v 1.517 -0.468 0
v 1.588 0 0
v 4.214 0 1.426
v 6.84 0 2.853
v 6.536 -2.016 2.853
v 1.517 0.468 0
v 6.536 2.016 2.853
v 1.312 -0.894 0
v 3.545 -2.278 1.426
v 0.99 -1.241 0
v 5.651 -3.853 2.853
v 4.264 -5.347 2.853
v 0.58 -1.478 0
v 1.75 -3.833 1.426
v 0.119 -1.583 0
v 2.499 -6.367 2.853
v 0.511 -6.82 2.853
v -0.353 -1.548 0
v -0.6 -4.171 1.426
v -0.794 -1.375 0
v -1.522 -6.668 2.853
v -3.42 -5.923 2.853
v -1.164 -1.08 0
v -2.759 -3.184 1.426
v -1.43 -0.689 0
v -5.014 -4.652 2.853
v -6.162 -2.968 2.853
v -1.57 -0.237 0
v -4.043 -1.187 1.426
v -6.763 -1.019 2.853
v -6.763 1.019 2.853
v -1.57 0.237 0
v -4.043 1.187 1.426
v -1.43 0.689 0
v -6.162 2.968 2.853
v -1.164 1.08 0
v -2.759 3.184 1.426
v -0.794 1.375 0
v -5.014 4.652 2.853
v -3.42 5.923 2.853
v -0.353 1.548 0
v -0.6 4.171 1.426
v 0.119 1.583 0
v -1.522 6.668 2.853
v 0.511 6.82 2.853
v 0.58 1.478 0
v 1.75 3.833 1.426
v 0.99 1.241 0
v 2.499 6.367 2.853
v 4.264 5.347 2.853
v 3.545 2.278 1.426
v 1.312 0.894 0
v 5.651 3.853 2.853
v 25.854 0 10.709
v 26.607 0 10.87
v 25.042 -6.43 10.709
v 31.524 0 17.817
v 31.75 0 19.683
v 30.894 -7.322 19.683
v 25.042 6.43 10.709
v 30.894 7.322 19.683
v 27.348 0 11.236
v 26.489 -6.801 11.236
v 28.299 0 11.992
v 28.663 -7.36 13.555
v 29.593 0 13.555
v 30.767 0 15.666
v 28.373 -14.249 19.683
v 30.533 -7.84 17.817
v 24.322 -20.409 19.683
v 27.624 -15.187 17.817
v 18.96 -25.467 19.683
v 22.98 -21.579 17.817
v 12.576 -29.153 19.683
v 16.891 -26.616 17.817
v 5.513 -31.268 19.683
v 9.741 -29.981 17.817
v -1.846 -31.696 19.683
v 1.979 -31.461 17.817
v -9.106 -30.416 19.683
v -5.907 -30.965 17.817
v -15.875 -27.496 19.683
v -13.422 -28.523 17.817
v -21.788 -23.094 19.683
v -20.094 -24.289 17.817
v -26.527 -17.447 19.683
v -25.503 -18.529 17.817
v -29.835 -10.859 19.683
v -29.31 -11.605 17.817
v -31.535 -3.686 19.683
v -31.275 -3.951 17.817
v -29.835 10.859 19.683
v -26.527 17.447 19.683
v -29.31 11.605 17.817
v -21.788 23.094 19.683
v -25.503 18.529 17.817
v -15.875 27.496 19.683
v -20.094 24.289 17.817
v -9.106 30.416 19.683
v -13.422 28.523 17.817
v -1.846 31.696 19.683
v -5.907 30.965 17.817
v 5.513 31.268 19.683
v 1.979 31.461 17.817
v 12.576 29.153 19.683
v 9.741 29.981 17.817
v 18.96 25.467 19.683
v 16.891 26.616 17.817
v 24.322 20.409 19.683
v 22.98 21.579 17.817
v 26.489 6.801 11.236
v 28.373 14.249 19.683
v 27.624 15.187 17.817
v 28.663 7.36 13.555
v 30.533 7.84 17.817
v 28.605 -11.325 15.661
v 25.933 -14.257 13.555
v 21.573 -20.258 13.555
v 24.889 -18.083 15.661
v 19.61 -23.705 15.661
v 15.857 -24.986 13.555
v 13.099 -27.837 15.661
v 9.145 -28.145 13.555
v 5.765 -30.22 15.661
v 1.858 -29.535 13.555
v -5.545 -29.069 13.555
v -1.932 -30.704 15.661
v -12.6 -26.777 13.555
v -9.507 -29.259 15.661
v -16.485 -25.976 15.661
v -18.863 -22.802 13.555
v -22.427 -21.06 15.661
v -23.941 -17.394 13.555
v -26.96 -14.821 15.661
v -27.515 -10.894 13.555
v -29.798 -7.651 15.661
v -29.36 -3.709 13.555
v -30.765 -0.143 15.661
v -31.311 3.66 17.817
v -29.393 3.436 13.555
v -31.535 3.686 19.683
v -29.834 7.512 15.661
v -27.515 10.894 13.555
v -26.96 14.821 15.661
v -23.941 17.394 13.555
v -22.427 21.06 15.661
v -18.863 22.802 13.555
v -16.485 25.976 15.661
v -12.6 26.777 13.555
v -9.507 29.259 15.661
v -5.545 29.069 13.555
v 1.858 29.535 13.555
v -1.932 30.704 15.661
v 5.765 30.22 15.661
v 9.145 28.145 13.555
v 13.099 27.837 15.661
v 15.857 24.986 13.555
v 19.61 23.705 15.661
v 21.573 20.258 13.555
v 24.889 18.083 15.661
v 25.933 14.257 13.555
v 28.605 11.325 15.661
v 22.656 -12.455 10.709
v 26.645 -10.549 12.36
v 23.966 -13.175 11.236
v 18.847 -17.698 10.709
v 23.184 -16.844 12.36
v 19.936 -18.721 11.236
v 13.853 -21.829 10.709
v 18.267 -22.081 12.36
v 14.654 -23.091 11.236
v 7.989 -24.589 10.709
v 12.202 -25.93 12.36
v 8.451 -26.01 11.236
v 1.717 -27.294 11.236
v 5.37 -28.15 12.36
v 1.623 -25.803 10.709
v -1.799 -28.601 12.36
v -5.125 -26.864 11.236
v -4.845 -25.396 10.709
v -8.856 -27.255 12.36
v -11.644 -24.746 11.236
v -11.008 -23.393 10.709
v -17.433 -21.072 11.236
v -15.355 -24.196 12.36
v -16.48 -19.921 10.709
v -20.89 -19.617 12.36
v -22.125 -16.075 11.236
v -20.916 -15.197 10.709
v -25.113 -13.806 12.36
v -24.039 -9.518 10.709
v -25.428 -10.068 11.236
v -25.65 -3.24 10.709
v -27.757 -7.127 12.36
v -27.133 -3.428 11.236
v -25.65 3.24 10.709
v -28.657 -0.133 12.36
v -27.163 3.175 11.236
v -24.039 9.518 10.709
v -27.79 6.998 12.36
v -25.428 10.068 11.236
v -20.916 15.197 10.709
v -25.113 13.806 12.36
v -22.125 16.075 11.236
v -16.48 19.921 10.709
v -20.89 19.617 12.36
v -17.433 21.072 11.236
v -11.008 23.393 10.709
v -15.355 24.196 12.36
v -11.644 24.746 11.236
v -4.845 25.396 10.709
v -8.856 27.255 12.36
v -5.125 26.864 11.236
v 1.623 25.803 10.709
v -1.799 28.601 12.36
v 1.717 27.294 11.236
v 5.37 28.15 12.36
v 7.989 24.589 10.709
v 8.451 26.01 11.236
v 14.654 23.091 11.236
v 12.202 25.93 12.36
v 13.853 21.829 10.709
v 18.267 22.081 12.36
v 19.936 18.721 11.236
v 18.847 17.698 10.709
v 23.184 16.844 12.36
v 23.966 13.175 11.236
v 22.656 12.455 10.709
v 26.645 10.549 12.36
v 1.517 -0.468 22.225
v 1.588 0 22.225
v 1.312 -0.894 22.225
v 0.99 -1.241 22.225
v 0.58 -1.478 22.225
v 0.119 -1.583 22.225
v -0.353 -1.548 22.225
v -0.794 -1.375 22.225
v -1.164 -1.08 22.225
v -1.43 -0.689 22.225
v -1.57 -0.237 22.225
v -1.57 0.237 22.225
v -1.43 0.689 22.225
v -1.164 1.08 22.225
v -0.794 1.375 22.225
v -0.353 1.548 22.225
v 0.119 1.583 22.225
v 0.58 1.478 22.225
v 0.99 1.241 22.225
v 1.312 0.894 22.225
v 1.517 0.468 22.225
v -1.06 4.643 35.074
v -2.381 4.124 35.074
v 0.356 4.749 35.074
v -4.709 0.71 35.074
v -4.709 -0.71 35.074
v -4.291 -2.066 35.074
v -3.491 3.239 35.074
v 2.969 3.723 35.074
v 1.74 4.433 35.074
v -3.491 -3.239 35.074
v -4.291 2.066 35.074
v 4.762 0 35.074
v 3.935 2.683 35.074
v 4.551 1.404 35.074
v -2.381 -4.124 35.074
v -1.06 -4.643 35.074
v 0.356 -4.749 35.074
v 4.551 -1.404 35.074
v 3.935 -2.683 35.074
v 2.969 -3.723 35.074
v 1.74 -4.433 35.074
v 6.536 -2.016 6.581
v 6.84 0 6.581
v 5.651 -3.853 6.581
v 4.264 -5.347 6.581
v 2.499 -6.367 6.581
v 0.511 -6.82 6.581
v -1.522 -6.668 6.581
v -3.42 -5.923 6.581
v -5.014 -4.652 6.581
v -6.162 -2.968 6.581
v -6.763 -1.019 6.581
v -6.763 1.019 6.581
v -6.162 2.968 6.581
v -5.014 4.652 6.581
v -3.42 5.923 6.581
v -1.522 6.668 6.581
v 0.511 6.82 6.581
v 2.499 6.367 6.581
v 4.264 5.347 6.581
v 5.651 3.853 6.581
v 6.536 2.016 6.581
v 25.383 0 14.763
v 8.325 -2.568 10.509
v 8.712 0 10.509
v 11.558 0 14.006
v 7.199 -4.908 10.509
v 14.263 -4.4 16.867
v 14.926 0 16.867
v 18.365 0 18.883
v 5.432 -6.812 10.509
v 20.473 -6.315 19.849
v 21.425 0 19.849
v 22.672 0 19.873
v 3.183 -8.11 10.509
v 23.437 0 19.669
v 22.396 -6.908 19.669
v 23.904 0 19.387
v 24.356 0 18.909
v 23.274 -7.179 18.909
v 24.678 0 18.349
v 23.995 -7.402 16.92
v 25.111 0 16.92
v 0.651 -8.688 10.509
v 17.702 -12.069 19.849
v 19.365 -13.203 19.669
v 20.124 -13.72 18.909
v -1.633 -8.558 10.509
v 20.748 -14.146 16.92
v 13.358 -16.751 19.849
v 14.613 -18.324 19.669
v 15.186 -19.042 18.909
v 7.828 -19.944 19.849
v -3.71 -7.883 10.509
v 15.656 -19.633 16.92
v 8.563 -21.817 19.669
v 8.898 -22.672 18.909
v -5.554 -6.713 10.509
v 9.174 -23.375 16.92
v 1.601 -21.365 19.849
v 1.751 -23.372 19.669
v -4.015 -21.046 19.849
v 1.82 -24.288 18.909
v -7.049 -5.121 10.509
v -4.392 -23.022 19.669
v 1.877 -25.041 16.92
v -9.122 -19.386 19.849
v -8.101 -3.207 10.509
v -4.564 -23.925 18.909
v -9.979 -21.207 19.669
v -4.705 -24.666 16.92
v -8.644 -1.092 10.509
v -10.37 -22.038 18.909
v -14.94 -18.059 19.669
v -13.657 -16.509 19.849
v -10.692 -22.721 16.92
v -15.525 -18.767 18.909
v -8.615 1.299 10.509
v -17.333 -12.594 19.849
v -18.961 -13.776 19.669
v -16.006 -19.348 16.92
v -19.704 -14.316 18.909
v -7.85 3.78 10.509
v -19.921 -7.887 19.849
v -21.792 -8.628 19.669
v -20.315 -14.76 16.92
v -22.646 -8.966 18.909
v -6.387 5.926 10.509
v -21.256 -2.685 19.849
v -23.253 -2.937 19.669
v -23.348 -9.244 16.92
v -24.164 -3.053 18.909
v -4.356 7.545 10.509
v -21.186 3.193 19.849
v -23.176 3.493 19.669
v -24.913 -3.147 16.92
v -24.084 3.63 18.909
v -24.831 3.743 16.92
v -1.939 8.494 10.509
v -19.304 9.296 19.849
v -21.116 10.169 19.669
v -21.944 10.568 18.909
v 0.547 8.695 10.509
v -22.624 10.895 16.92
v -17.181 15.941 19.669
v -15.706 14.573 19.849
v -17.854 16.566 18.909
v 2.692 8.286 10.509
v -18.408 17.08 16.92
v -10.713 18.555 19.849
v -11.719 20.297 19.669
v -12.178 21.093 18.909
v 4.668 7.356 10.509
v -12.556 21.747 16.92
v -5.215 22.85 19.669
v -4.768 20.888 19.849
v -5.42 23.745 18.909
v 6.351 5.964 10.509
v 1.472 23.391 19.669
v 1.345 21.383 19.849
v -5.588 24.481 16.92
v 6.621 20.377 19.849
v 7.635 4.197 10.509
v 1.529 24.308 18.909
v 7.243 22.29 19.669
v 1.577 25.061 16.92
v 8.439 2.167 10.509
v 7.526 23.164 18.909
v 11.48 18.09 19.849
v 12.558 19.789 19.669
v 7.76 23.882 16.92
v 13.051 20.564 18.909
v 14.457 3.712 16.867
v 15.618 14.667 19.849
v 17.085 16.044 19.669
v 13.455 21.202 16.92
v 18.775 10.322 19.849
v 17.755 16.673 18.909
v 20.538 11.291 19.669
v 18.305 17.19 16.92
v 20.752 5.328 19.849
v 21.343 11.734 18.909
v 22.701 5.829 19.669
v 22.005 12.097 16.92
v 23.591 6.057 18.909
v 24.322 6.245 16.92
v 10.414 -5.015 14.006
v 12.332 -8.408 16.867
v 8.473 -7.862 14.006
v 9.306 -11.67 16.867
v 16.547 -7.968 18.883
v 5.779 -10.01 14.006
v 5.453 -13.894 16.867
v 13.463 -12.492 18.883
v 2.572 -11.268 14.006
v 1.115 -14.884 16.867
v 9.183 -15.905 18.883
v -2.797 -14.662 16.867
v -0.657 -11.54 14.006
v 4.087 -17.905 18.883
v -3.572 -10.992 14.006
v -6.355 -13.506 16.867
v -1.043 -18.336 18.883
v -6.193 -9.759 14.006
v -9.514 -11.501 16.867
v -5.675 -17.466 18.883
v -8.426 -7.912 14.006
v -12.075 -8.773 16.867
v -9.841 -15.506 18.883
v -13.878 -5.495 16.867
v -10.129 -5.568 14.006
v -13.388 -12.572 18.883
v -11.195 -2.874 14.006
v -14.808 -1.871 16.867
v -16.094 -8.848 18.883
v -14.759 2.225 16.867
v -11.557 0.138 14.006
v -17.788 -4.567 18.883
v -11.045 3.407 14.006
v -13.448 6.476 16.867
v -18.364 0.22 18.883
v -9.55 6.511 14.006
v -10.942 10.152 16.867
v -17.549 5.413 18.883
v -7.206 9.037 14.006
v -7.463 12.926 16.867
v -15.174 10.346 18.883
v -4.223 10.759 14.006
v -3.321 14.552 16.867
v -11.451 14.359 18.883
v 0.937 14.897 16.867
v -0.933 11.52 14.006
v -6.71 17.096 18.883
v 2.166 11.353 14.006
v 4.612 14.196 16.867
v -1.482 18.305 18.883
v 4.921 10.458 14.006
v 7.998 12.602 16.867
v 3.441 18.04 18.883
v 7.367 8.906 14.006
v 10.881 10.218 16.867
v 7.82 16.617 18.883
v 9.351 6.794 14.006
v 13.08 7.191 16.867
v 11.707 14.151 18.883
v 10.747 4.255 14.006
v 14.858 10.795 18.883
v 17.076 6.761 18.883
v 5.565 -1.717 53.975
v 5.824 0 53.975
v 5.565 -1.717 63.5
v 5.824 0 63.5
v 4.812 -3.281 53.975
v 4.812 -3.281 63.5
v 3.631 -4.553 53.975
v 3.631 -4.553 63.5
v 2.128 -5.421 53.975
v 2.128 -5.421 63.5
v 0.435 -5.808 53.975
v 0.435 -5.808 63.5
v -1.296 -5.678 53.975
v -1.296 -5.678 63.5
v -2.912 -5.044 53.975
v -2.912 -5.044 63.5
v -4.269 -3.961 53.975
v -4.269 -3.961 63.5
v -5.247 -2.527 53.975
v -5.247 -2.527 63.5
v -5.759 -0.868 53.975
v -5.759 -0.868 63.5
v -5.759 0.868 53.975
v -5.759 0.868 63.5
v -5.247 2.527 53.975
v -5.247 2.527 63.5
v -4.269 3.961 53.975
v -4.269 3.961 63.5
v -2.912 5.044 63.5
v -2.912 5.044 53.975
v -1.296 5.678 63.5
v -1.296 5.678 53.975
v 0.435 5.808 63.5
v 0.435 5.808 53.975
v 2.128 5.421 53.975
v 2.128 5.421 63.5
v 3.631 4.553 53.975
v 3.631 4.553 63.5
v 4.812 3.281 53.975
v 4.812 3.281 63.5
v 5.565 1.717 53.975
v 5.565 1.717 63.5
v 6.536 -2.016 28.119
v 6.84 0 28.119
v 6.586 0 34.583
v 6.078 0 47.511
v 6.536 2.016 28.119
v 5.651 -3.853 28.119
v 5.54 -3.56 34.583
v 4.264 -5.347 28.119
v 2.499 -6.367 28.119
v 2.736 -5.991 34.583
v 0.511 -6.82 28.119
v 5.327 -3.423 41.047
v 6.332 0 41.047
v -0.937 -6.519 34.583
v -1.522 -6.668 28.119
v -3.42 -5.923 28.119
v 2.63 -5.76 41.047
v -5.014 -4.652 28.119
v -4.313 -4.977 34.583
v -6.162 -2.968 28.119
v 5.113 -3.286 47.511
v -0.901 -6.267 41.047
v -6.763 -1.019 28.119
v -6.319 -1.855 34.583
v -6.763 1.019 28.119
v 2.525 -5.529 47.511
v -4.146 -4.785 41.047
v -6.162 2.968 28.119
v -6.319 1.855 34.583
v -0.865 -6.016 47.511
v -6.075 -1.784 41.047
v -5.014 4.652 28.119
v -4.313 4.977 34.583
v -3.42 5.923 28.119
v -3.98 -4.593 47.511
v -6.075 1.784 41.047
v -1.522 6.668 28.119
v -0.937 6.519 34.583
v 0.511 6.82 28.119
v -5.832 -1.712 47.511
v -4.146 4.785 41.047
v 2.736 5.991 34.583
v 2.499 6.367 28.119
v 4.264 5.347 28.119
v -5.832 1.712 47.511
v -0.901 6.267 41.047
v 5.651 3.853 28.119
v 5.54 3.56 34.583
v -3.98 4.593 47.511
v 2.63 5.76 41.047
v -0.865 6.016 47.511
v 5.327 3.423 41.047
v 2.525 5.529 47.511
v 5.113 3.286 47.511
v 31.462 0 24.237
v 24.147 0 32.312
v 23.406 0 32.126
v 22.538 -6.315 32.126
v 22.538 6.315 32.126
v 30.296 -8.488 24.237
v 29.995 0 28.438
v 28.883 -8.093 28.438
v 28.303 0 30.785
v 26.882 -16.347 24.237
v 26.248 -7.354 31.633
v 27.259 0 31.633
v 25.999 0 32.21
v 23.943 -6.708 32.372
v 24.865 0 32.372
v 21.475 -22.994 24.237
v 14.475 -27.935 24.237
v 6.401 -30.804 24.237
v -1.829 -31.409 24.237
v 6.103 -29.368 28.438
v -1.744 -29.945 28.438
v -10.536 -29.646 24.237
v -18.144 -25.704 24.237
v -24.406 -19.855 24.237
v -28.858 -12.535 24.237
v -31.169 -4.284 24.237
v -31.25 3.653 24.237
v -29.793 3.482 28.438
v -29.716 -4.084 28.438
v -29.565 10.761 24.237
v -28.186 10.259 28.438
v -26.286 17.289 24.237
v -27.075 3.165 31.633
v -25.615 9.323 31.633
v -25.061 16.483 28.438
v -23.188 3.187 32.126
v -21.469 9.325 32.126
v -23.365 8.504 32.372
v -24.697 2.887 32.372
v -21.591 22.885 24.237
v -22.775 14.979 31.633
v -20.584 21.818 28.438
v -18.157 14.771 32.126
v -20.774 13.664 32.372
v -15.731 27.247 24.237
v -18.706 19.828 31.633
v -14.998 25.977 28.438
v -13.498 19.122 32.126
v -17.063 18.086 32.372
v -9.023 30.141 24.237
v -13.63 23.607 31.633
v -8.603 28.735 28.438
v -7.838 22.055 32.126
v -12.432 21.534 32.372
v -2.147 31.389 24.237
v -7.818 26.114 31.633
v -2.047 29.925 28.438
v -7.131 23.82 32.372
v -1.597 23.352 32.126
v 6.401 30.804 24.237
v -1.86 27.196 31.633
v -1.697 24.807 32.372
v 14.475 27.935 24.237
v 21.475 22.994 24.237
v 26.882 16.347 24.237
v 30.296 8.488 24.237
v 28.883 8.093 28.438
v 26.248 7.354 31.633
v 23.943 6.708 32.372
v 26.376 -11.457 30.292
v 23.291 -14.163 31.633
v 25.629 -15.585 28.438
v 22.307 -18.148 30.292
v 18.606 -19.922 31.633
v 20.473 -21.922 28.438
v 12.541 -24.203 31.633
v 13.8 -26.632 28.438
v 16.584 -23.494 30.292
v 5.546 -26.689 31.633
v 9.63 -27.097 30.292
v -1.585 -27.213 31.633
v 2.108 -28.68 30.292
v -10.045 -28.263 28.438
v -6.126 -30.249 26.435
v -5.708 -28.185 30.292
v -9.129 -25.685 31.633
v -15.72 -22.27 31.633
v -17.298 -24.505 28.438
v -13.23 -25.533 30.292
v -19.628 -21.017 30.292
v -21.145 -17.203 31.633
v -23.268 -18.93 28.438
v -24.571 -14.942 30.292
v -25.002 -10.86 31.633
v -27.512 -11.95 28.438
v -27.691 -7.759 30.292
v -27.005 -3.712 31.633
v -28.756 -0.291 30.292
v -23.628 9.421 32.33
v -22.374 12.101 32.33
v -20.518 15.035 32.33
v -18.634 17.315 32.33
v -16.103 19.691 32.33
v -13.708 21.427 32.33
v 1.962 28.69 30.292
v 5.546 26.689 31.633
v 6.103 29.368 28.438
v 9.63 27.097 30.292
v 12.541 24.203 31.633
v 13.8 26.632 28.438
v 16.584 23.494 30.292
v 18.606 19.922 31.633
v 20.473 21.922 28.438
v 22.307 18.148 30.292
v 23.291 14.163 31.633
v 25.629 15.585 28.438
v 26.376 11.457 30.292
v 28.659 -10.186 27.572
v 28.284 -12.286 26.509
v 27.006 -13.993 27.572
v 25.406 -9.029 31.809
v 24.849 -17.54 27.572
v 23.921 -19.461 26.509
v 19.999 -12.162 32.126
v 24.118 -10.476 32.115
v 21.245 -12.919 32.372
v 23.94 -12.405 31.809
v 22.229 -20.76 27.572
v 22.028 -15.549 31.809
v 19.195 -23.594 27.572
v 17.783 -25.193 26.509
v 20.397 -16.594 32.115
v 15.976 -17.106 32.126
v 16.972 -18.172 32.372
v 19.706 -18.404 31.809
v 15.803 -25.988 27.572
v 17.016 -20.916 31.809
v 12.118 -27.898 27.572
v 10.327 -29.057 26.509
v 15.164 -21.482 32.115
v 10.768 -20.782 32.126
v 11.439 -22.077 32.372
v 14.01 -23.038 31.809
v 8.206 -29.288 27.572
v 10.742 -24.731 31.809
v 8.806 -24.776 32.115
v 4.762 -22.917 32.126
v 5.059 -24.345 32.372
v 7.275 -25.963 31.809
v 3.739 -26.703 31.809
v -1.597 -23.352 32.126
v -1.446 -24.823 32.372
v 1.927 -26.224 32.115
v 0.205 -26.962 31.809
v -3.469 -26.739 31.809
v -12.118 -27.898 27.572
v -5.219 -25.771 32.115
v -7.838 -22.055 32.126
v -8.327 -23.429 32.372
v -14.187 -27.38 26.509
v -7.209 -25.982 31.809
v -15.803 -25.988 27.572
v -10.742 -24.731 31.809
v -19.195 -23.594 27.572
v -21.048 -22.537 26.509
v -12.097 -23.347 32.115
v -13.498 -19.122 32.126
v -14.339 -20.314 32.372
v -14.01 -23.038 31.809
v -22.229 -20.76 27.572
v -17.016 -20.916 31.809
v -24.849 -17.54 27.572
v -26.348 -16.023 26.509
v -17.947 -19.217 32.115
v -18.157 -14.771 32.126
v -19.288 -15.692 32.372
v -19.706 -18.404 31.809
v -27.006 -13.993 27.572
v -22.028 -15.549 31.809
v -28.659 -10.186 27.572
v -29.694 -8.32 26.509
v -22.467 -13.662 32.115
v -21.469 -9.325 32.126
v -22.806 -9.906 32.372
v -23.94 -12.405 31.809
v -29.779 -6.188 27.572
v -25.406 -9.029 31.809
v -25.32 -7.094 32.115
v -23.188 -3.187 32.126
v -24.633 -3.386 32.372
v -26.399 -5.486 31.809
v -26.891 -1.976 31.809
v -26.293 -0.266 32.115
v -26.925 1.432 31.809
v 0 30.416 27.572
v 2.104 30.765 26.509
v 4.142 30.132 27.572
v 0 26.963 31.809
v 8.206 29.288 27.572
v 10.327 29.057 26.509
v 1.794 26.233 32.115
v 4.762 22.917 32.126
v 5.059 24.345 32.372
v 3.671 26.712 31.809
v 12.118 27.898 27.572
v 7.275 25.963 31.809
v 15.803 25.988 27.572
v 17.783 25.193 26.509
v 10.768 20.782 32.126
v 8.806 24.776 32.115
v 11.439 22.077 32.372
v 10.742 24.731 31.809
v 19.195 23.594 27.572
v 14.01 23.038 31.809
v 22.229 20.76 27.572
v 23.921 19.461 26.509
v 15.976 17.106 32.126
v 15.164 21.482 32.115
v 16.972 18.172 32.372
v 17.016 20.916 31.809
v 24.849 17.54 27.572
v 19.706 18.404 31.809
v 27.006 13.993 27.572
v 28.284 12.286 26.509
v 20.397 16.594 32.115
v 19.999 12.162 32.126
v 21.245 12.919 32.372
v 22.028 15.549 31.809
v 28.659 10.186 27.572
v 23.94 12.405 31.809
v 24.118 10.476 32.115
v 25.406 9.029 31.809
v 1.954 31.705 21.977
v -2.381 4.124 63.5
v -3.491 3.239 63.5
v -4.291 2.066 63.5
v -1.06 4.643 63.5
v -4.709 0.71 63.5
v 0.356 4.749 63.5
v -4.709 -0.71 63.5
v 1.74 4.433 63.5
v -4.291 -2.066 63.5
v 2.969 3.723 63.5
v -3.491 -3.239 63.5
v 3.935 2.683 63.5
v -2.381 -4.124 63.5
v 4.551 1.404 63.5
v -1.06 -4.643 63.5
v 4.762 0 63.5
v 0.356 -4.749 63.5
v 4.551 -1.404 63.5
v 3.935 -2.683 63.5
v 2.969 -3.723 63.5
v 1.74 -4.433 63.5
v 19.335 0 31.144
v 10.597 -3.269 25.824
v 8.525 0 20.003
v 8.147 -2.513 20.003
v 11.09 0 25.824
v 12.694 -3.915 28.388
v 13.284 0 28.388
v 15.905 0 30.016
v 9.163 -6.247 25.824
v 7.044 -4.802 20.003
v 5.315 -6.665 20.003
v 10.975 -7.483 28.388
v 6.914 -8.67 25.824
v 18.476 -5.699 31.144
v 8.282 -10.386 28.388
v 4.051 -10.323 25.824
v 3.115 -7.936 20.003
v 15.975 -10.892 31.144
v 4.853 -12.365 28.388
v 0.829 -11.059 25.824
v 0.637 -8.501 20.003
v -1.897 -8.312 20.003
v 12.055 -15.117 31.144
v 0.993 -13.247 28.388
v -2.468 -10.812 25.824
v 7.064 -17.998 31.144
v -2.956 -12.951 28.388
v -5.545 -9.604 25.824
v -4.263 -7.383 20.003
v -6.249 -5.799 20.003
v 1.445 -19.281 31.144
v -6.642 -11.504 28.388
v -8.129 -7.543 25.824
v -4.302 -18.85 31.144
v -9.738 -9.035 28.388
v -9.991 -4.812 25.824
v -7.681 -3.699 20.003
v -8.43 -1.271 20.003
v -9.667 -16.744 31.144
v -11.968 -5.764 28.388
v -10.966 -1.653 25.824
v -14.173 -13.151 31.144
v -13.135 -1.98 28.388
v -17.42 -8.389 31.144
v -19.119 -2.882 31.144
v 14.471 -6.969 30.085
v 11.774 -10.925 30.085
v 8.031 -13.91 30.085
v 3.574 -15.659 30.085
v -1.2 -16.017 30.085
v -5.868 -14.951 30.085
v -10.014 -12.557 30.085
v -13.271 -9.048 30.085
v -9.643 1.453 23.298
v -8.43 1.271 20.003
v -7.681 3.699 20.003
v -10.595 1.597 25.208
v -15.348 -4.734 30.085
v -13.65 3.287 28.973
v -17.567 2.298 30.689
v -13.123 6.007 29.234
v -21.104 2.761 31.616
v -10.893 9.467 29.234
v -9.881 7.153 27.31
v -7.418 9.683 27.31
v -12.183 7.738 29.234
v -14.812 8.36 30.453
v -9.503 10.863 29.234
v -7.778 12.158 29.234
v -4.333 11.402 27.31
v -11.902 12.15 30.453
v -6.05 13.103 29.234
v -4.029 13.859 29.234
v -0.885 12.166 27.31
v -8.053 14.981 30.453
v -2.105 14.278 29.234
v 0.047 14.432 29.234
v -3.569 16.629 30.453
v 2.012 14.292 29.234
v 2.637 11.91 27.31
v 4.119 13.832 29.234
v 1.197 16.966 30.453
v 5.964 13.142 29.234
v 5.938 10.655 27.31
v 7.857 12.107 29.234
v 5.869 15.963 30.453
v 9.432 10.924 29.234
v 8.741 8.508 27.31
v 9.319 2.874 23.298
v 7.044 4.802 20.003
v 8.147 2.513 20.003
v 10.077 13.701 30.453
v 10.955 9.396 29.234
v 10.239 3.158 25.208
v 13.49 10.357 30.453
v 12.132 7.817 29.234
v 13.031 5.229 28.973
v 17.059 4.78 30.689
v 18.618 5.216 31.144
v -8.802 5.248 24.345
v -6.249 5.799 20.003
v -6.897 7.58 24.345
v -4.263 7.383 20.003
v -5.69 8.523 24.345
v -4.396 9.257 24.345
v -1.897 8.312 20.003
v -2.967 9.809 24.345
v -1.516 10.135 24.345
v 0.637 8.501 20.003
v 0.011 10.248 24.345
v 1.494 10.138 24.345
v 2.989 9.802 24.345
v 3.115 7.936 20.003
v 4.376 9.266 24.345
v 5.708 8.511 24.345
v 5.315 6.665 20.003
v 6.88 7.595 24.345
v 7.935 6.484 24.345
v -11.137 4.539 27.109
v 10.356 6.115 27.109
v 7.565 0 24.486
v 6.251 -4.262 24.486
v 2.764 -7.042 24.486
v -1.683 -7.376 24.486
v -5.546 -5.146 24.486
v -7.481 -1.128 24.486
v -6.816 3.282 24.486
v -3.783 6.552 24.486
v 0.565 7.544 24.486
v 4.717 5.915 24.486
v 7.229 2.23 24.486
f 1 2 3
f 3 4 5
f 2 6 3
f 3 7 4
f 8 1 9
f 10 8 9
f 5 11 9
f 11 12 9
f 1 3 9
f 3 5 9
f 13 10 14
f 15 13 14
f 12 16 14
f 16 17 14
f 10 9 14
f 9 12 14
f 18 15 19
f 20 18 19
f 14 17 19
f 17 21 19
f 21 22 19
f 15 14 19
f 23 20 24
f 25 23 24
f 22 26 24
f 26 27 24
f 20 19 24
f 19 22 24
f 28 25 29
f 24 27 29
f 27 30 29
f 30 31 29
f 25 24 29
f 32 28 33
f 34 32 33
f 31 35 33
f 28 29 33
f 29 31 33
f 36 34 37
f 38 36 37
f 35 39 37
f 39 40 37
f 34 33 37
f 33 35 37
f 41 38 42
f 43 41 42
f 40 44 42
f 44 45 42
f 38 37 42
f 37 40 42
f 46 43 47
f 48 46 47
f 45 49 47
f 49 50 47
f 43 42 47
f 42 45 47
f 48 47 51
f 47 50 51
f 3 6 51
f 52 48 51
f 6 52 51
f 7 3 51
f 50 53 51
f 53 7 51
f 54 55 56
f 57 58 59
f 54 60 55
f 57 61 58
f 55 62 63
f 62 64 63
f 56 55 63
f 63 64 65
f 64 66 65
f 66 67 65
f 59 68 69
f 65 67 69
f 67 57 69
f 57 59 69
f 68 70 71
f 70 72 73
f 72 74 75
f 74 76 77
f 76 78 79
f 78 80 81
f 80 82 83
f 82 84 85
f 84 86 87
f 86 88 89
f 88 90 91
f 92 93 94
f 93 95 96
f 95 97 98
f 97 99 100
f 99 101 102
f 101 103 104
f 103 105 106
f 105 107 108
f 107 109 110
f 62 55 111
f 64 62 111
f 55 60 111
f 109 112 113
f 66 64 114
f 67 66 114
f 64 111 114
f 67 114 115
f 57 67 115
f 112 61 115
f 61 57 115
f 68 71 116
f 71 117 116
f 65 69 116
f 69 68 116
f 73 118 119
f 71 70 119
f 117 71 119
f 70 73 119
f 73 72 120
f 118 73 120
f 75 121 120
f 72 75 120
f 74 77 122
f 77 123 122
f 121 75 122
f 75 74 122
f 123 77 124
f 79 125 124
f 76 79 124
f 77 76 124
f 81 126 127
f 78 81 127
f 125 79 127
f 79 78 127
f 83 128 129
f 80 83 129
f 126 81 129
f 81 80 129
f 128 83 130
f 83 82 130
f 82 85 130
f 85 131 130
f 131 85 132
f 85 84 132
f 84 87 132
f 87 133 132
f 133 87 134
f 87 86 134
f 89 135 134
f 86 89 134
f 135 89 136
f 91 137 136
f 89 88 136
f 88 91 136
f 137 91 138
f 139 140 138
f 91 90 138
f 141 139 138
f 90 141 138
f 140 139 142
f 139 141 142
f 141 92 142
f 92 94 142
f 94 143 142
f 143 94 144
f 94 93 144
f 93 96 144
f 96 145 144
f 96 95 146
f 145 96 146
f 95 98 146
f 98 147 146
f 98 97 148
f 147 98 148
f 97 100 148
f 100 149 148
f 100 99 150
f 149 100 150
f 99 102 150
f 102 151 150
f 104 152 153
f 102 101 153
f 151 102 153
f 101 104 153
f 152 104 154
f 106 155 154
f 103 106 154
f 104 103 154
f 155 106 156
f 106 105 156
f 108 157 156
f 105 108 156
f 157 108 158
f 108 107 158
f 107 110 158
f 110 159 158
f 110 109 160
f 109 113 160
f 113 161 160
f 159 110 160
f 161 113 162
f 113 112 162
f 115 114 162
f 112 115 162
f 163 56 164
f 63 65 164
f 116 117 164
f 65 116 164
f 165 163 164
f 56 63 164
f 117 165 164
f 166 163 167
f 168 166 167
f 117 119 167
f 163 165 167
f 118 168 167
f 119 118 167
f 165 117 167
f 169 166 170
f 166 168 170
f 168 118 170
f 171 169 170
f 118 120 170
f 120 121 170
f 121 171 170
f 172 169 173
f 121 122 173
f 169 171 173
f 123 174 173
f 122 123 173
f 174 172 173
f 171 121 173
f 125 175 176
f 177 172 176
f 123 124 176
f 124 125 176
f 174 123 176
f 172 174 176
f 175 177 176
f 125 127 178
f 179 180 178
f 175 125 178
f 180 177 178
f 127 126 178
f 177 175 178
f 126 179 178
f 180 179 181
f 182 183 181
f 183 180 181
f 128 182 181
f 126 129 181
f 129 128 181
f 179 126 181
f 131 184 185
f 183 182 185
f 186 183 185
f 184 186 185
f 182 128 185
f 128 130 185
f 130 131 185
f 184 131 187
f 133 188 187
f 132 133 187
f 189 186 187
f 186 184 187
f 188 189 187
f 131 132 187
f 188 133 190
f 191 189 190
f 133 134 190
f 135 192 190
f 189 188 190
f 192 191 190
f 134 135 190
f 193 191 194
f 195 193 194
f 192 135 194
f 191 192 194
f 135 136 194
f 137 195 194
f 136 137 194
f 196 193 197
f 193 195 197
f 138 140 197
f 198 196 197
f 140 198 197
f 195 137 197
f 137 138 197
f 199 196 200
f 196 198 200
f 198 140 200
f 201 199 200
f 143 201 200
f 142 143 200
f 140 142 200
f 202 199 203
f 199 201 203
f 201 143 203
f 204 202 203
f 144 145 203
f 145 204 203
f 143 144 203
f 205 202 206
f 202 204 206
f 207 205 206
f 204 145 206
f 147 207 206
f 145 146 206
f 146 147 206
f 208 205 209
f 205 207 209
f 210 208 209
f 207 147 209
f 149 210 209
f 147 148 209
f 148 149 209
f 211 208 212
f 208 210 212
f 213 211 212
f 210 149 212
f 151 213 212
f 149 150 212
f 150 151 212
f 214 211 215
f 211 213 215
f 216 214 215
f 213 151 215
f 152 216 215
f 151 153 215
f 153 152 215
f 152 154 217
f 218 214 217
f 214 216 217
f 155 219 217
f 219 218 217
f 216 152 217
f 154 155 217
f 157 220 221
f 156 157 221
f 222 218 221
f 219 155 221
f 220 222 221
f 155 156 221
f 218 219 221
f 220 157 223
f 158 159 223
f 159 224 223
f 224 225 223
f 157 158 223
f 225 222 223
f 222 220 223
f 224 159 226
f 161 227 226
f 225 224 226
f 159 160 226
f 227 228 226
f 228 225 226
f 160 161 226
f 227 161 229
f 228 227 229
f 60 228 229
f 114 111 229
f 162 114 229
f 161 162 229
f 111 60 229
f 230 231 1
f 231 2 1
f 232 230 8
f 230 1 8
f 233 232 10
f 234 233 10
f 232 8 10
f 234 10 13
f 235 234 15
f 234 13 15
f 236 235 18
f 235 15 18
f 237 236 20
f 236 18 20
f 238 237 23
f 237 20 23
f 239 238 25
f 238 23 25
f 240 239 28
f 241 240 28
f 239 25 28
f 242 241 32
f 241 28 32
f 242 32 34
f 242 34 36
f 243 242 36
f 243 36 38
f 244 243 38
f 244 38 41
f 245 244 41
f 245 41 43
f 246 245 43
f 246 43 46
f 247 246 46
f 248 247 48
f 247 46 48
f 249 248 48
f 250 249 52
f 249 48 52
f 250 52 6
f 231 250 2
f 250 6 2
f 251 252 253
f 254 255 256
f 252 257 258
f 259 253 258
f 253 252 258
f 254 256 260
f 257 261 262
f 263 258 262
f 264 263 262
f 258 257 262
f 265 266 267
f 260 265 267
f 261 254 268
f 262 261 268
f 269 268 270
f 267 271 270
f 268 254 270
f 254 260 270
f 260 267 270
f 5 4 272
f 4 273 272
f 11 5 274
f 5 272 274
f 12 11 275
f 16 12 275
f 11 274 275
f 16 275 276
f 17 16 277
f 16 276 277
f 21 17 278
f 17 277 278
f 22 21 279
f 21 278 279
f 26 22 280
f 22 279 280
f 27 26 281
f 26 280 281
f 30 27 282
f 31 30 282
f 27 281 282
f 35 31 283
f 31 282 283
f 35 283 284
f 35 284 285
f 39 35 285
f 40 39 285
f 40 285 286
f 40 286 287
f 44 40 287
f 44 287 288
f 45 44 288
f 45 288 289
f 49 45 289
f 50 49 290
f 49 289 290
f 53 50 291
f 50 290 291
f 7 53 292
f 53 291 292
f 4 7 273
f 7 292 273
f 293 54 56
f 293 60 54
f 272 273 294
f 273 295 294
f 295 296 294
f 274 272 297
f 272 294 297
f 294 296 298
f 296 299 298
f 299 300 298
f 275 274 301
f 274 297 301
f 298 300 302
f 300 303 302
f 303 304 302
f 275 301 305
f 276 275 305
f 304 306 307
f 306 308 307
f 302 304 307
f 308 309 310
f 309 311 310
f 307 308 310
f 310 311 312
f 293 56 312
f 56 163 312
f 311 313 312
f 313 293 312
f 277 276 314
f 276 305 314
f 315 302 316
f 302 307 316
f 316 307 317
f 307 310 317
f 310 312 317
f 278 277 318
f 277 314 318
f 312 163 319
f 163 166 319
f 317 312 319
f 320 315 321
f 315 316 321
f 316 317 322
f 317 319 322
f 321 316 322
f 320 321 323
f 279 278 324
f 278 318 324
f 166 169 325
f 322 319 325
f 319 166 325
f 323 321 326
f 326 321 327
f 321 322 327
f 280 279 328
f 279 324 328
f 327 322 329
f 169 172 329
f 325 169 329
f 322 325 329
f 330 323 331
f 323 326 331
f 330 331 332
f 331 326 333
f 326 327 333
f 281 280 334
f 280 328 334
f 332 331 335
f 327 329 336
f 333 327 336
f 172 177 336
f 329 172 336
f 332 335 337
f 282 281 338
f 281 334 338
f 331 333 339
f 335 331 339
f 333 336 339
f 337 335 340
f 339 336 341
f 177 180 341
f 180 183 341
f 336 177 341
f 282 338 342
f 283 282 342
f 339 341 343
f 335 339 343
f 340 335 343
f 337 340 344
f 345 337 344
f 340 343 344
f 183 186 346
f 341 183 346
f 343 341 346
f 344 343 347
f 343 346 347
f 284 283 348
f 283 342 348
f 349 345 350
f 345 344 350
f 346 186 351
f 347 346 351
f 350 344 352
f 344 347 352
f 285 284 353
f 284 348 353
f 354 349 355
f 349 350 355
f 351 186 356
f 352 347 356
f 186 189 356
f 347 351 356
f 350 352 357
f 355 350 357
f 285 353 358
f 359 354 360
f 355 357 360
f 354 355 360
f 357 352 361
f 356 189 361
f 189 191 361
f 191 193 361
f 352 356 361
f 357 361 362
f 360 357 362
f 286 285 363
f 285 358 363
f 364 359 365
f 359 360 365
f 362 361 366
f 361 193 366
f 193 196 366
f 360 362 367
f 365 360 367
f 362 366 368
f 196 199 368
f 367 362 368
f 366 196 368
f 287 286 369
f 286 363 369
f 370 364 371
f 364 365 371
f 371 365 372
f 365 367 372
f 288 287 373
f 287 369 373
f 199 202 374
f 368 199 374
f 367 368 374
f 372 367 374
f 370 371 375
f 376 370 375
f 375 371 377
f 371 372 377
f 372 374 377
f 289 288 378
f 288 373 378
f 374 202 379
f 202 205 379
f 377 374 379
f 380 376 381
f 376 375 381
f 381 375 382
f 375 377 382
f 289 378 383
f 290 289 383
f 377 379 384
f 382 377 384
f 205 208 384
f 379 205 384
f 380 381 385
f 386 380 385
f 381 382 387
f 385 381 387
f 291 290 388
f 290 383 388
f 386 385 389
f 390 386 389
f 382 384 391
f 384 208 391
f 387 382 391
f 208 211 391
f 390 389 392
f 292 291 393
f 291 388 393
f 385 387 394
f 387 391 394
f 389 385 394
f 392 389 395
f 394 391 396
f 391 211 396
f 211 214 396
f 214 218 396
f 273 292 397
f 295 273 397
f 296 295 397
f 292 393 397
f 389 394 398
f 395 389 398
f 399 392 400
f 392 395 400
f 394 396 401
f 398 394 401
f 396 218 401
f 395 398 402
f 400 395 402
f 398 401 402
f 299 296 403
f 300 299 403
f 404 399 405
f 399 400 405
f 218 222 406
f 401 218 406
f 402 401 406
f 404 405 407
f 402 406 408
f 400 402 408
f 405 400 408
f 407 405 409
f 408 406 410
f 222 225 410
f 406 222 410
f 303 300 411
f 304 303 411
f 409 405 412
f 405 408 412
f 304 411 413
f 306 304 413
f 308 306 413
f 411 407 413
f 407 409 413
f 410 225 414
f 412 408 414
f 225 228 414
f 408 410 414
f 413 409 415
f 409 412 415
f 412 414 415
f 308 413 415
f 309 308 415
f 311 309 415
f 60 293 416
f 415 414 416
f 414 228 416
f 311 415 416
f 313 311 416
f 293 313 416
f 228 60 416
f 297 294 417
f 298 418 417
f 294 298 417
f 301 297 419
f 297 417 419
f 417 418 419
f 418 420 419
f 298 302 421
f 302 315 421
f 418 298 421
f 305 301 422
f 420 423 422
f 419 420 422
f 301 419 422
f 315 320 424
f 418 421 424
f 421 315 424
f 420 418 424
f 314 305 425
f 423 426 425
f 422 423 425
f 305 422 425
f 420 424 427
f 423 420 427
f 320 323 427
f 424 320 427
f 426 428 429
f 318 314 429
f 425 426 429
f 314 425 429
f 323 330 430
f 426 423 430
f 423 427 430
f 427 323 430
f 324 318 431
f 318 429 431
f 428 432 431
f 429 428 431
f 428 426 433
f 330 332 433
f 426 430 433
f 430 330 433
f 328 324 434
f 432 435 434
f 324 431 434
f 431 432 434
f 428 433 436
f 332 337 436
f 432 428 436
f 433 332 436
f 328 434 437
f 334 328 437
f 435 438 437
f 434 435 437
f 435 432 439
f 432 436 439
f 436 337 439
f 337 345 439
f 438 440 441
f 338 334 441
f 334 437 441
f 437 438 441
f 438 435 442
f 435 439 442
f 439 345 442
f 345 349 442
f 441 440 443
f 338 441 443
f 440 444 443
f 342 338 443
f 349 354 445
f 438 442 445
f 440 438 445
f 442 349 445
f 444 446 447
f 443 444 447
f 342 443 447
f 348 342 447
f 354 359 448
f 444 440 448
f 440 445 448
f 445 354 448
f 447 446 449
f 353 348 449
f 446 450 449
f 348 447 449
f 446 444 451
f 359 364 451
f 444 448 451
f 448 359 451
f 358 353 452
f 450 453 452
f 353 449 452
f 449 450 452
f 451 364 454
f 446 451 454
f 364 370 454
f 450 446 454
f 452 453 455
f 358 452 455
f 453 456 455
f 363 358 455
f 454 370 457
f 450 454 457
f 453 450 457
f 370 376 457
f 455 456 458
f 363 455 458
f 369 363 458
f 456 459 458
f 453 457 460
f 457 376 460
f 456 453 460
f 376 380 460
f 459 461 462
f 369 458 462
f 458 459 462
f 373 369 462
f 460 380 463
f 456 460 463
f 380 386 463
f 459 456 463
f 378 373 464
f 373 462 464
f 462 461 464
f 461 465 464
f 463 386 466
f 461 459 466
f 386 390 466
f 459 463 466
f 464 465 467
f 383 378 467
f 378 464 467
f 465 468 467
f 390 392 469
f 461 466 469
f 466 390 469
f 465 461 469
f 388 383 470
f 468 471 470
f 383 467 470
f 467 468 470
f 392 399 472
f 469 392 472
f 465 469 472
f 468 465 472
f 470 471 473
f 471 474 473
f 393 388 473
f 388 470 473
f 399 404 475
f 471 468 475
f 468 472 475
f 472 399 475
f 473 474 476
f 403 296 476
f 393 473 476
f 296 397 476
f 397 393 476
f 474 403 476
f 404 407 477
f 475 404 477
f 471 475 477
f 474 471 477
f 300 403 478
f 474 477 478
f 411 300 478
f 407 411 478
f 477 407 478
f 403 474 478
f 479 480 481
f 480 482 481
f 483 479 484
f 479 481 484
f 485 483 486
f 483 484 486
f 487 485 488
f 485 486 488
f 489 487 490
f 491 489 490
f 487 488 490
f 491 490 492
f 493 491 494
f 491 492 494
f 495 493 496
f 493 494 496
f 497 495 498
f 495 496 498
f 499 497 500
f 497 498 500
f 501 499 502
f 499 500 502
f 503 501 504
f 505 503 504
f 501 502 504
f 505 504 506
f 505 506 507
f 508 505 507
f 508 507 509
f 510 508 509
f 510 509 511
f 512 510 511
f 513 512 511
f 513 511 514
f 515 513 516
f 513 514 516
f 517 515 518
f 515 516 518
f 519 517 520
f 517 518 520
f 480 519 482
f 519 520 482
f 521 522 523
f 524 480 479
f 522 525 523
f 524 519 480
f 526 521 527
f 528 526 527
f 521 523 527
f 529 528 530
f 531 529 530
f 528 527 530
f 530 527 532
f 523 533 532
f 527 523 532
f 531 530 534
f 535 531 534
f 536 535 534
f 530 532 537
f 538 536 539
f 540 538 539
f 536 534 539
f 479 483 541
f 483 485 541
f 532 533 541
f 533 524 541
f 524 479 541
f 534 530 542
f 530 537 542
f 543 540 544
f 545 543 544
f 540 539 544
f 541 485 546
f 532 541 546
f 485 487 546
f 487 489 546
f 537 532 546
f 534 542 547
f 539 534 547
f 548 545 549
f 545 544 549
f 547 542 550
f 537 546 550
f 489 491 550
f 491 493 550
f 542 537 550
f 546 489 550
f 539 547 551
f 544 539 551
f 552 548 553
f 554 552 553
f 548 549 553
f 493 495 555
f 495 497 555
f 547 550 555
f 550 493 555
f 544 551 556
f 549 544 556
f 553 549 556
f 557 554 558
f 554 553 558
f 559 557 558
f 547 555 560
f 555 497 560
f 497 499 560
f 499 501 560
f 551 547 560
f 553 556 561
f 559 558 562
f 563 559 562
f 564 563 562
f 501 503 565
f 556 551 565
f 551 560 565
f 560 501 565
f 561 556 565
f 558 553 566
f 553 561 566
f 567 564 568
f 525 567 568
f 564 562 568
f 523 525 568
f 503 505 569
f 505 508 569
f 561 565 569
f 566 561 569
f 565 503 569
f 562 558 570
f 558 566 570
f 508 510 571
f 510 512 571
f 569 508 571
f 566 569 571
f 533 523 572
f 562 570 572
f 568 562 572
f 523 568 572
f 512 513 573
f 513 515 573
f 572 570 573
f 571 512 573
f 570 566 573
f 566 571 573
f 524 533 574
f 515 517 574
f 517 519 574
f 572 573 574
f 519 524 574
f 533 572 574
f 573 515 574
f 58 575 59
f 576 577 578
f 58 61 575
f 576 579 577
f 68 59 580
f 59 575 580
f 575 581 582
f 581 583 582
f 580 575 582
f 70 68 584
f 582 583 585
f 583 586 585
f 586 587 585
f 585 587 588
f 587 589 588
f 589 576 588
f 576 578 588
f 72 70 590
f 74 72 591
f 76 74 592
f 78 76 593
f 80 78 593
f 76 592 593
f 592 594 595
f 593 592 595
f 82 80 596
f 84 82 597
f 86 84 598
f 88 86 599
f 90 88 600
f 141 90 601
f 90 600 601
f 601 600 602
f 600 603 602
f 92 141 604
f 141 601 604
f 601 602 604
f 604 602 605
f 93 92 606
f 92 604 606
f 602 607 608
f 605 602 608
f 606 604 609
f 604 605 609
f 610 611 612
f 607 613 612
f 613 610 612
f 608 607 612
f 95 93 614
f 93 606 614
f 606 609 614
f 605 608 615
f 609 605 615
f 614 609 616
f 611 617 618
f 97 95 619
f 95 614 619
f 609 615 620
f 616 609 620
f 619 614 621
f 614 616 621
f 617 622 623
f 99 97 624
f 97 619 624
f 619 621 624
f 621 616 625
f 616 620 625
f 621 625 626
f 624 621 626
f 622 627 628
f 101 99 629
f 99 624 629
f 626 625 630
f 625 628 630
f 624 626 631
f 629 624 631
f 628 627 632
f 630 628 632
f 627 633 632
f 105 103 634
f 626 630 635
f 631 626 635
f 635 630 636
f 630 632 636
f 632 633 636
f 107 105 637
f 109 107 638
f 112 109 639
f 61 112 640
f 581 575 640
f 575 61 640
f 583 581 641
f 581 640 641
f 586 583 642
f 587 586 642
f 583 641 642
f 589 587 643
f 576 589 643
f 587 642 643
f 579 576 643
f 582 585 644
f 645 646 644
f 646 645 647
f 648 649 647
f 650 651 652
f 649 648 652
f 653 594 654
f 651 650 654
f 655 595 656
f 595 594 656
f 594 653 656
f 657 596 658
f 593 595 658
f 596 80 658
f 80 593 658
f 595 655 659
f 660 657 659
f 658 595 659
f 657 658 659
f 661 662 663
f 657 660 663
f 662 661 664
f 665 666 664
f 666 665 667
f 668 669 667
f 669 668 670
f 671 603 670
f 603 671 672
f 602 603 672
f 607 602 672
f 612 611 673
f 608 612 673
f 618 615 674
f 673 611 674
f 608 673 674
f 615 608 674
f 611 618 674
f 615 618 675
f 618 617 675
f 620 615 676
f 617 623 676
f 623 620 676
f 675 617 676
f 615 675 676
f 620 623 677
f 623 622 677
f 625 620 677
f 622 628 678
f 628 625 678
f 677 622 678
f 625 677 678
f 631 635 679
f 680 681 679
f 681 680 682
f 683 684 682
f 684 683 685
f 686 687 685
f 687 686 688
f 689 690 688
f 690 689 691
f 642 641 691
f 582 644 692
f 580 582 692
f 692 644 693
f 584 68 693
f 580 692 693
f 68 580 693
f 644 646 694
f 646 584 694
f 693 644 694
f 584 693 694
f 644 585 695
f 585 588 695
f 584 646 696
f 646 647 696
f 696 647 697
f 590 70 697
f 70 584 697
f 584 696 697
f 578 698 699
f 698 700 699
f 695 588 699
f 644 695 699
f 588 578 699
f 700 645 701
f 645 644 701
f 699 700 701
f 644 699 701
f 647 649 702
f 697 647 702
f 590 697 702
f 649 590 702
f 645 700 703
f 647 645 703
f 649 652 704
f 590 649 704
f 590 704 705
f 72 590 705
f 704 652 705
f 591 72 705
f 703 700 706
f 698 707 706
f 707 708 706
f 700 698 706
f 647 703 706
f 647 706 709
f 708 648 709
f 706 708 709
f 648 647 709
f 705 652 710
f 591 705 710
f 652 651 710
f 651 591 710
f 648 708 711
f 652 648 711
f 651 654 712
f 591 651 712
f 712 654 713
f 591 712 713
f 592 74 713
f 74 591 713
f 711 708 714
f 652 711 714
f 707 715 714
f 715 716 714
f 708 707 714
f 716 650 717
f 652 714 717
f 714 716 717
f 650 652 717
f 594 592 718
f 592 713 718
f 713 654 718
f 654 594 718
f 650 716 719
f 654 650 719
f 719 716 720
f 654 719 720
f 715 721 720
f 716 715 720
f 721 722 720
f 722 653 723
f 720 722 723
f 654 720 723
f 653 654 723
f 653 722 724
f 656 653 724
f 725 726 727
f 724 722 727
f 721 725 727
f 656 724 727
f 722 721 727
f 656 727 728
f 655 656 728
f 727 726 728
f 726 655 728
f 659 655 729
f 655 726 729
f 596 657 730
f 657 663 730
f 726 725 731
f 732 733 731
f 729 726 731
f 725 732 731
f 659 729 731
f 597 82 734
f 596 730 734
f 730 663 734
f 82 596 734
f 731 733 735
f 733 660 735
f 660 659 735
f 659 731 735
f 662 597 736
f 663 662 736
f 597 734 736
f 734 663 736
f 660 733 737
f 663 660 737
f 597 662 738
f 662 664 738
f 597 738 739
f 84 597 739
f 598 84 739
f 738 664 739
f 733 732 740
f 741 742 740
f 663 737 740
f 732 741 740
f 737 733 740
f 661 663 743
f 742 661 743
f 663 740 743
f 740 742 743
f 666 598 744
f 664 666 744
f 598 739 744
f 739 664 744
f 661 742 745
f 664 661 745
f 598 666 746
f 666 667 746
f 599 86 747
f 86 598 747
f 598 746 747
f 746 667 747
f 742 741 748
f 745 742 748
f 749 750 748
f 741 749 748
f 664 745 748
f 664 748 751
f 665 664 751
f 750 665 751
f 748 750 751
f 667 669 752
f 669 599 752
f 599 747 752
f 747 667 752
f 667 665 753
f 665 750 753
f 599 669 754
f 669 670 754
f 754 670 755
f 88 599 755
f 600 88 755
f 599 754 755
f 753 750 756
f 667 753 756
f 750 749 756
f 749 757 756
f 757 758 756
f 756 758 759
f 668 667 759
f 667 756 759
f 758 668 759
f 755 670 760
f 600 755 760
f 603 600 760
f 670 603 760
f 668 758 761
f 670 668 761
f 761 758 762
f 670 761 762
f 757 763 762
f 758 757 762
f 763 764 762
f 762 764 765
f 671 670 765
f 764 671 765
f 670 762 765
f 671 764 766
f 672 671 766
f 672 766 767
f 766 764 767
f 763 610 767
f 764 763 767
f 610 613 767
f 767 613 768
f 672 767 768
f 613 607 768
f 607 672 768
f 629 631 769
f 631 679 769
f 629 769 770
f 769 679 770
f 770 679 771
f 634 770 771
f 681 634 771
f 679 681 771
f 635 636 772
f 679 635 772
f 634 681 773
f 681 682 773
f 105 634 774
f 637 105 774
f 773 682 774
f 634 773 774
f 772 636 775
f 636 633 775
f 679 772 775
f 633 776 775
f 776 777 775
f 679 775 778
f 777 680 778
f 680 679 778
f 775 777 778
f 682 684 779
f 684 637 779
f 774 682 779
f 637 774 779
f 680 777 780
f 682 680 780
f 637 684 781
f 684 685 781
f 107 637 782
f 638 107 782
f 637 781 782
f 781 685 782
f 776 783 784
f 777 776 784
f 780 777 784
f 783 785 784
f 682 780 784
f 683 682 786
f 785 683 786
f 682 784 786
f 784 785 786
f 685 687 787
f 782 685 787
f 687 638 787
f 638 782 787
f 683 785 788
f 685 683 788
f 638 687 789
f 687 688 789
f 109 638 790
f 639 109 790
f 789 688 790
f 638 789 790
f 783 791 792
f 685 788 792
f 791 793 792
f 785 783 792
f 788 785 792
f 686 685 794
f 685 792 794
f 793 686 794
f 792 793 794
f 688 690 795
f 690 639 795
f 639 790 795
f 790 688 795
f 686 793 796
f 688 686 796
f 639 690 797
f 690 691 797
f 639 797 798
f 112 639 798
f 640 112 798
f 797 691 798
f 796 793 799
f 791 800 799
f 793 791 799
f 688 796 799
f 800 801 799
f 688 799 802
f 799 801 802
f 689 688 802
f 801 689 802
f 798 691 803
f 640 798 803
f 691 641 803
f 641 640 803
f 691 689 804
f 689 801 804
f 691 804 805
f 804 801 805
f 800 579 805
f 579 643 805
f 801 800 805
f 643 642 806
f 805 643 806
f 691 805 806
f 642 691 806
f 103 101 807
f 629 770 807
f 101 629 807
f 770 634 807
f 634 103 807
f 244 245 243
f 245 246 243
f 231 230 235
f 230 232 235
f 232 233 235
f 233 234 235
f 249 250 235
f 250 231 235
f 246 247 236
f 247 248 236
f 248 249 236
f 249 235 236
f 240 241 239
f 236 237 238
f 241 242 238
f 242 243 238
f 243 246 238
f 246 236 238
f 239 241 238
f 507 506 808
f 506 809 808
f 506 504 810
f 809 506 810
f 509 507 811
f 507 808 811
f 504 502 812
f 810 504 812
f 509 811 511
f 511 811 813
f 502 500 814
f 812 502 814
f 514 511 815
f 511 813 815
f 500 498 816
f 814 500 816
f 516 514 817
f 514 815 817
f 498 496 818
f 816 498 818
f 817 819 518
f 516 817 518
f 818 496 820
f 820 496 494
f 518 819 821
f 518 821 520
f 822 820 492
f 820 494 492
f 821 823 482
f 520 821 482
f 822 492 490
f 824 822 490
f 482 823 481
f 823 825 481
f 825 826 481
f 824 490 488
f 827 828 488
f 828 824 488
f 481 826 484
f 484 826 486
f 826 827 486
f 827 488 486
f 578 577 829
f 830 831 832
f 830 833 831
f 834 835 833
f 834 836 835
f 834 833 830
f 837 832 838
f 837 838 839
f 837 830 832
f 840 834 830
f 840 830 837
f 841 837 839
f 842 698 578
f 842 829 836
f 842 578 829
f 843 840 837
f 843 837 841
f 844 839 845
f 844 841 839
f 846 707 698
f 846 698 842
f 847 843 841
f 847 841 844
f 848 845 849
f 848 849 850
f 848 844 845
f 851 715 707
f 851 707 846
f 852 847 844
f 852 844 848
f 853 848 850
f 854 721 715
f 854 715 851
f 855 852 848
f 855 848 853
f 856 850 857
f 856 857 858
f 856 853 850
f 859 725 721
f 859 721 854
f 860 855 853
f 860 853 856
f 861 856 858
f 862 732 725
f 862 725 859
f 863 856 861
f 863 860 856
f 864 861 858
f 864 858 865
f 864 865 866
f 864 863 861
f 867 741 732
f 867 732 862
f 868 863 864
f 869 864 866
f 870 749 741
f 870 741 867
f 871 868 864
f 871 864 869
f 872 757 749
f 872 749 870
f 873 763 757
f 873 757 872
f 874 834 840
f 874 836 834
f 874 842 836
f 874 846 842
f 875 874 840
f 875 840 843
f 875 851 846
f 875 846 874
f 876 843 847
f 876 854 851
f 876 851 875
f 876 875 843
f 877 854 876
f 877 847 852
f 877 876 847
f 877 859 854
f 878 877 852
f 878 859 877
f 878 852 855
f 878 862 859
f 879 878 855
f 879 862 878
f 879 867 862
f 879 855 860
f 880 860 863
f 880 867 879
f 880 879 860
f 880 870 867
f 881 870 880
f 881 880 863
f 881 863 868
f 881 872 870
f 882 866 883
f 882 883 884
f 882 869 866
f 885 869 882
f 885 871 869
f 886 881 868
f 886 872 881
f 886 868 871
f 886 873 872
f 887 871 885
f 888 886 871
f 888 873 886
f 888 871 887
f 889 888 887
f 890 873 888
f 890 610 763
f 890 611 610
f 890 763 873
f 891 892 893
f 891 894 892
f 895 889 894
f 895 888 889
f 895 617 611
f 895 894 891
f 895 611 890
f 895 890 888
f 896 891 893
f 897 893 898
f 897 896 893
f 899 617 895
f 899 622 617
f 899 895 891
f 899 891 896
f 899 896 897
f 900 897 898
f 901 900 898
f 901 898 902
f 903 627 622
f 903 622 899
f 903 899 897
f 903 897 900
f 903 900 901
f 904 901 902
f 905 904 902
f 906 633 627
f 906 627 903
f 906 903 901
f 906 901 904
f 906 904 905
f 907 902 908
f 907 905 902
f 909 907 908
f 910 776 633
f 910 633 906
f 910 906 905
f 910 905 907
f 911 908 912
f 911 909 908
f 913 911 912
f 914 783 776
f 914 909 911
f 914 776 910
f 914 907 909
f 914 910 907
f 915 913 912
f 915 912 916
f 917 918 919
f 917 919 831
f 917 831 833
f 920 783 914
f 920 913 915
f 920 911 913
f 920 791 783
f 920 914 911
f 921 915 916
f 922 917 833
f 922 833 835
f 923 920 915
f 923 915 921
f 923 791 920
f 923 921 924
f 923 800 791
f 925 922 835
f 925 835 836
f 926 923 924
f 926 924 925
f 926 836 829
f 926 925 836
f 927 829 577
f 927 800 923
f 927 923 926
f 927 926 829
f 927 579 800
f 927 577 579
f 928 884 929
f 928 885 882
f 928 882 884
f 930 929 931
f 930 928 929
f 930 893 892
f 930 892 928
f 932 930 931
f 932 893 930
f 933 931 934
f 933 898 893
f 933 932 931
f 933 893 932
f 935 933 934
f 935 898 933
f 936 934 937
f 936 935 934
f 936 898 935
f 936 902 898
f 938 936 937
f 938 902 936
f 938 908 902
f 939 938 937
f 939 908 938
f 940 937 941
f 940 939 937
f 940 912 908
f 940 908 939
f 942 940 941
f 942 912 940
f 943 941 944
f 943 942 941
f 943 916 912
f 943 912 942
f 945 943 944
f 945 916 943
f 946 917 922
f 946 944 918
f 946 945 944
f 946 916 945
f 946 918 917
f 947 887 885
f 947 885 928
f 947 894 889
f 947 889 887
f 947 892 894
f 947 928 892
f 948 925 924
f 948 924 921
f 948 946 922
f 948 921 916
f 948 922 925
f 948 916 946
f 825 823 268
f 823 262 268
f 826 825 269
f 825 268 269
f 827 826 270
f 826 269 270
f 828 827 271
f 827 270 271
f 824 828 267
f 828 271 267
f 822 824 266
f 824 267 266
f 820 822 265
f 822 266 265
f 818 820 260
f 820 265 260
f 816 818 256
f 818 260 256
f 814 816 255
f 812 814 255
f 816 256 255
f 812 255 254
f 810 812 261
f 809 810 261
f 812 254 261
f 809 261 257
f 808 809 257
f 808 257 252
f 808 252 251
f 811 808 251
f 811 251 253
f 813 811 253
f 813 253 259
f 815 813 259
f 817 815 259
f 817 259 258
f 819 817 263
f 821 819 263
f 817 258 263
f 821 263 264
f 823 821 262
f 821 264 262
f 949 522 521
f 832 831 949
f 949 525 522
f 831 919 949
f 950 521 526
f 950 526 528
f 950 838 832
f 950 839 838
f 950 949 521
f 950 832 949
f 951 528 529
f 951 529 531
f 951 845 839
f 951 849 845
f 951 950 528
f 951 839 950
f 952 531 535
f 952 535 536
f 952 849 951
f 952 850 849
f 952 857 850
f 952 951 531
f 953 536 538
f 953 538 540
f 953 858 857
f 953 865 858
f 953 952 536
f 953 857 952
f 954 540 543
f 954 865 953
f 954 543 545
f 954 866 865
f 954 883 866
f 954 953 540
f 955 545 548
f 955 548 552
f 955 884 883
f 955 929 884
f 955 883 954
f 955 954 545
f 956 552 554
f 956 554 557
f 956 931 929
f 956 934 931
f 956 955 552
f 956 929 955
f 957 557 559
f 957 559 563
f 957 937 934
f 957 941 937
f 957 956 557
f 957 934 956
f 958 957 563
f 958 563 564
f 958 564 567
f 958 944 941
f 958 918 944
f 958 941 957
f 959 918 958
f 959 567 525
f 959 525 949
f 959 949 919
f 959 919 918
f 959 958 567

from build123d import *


with BuildPart() as f1:
    # F0 (on Front) → F1 (revolve)
    with BuildSketch(Plane.XZ):
        with BuildLine():
            Line((0, 35.0735469929), (0, 22.225))
            Line((0, 22.225), (1.5875, 22.225))
            Line((1.5875, 22.225), (1.5875, 0))
            Line((1.5875, 0), (6.8395659328, 2.8525609487))
            Line((6.8395659328, 2.8525609487), (6.8395659328, 6.581468042))
            add(Edge.make_bspline(
                [(6.8395659328, 6.581468042), (9.2535042955, 14.5349160115), (26.8148100025, 25.6466174733), (25.1153818248, 14.0338175567), (25.8540902287, 10.7087958604)],
                knots=[0, 0, 0, 0, 0.6010976221, 1, 1, 1, 1], degree=3))
            add(Edge.make_bspline(
                [(25.8540902287, 10.7087958604), (28.8945547553, 10.9060499812), (31.8909995258, 16.7905778438), (31.75, 19.6825712919)],
                knots=[0, 0, 0, 0, 10.7373366123, 10.7373366123, 10.7373366123, 10.7373366123], degree=3))
            add(Edge.make_bspline(
                [(31.75, 19.6825712919), (32.2793722153, 26.0070748627), (28.5891406238, 33.8649395853), (23.4063658863, 32.1263857186)],
                knots=[0, 0, 0, 0, 14.9821476334, 14.9821476334, 14.9821476334, 14.9821476334], degree=3))
            add(Edge.make_bspline(
                [(8.5253027175, 20.0025010854), (11.7796752602, 30.2905943245), (16.0631947219, 30.2905943245), (23.4063658863, 32.1263857186)],
                knots=[0, 0, 0, 0, 19.1946508078, 19.1946508078, 19.1946508078, 19.1946508078], degree=3))
            add(Edge.make_bspline(
                [(6.8395659328, 28.1185149488), (7.526251053, 26.3757562888), (7.526251053, 22.8787242203), (8.5253027175, 20.0025010854)],
                knots=[0, 0, 0, 0, 8.2892333505, 8.2892333505, 8.2892333505, 8.2892333505], degree=3))
            Line((6.8395659328, 28.1185149488), (5.8238464211, 53.975))
            Line((5.8238464211, 53.975), (5.8238464211, 63.5))
            Line((5.8238464211, 63.5), (4.7625, 63.5))
            Line((4.7625, 63.5), (4.7625, 35.0735469929))
            Line((4.7625, 35.0735469929), (0, 35.0735469929))
        make_face()
    revolve(axis=Axis((0, 0, 17.5367734964), (0, 0, -1)))


solid = f1.part
